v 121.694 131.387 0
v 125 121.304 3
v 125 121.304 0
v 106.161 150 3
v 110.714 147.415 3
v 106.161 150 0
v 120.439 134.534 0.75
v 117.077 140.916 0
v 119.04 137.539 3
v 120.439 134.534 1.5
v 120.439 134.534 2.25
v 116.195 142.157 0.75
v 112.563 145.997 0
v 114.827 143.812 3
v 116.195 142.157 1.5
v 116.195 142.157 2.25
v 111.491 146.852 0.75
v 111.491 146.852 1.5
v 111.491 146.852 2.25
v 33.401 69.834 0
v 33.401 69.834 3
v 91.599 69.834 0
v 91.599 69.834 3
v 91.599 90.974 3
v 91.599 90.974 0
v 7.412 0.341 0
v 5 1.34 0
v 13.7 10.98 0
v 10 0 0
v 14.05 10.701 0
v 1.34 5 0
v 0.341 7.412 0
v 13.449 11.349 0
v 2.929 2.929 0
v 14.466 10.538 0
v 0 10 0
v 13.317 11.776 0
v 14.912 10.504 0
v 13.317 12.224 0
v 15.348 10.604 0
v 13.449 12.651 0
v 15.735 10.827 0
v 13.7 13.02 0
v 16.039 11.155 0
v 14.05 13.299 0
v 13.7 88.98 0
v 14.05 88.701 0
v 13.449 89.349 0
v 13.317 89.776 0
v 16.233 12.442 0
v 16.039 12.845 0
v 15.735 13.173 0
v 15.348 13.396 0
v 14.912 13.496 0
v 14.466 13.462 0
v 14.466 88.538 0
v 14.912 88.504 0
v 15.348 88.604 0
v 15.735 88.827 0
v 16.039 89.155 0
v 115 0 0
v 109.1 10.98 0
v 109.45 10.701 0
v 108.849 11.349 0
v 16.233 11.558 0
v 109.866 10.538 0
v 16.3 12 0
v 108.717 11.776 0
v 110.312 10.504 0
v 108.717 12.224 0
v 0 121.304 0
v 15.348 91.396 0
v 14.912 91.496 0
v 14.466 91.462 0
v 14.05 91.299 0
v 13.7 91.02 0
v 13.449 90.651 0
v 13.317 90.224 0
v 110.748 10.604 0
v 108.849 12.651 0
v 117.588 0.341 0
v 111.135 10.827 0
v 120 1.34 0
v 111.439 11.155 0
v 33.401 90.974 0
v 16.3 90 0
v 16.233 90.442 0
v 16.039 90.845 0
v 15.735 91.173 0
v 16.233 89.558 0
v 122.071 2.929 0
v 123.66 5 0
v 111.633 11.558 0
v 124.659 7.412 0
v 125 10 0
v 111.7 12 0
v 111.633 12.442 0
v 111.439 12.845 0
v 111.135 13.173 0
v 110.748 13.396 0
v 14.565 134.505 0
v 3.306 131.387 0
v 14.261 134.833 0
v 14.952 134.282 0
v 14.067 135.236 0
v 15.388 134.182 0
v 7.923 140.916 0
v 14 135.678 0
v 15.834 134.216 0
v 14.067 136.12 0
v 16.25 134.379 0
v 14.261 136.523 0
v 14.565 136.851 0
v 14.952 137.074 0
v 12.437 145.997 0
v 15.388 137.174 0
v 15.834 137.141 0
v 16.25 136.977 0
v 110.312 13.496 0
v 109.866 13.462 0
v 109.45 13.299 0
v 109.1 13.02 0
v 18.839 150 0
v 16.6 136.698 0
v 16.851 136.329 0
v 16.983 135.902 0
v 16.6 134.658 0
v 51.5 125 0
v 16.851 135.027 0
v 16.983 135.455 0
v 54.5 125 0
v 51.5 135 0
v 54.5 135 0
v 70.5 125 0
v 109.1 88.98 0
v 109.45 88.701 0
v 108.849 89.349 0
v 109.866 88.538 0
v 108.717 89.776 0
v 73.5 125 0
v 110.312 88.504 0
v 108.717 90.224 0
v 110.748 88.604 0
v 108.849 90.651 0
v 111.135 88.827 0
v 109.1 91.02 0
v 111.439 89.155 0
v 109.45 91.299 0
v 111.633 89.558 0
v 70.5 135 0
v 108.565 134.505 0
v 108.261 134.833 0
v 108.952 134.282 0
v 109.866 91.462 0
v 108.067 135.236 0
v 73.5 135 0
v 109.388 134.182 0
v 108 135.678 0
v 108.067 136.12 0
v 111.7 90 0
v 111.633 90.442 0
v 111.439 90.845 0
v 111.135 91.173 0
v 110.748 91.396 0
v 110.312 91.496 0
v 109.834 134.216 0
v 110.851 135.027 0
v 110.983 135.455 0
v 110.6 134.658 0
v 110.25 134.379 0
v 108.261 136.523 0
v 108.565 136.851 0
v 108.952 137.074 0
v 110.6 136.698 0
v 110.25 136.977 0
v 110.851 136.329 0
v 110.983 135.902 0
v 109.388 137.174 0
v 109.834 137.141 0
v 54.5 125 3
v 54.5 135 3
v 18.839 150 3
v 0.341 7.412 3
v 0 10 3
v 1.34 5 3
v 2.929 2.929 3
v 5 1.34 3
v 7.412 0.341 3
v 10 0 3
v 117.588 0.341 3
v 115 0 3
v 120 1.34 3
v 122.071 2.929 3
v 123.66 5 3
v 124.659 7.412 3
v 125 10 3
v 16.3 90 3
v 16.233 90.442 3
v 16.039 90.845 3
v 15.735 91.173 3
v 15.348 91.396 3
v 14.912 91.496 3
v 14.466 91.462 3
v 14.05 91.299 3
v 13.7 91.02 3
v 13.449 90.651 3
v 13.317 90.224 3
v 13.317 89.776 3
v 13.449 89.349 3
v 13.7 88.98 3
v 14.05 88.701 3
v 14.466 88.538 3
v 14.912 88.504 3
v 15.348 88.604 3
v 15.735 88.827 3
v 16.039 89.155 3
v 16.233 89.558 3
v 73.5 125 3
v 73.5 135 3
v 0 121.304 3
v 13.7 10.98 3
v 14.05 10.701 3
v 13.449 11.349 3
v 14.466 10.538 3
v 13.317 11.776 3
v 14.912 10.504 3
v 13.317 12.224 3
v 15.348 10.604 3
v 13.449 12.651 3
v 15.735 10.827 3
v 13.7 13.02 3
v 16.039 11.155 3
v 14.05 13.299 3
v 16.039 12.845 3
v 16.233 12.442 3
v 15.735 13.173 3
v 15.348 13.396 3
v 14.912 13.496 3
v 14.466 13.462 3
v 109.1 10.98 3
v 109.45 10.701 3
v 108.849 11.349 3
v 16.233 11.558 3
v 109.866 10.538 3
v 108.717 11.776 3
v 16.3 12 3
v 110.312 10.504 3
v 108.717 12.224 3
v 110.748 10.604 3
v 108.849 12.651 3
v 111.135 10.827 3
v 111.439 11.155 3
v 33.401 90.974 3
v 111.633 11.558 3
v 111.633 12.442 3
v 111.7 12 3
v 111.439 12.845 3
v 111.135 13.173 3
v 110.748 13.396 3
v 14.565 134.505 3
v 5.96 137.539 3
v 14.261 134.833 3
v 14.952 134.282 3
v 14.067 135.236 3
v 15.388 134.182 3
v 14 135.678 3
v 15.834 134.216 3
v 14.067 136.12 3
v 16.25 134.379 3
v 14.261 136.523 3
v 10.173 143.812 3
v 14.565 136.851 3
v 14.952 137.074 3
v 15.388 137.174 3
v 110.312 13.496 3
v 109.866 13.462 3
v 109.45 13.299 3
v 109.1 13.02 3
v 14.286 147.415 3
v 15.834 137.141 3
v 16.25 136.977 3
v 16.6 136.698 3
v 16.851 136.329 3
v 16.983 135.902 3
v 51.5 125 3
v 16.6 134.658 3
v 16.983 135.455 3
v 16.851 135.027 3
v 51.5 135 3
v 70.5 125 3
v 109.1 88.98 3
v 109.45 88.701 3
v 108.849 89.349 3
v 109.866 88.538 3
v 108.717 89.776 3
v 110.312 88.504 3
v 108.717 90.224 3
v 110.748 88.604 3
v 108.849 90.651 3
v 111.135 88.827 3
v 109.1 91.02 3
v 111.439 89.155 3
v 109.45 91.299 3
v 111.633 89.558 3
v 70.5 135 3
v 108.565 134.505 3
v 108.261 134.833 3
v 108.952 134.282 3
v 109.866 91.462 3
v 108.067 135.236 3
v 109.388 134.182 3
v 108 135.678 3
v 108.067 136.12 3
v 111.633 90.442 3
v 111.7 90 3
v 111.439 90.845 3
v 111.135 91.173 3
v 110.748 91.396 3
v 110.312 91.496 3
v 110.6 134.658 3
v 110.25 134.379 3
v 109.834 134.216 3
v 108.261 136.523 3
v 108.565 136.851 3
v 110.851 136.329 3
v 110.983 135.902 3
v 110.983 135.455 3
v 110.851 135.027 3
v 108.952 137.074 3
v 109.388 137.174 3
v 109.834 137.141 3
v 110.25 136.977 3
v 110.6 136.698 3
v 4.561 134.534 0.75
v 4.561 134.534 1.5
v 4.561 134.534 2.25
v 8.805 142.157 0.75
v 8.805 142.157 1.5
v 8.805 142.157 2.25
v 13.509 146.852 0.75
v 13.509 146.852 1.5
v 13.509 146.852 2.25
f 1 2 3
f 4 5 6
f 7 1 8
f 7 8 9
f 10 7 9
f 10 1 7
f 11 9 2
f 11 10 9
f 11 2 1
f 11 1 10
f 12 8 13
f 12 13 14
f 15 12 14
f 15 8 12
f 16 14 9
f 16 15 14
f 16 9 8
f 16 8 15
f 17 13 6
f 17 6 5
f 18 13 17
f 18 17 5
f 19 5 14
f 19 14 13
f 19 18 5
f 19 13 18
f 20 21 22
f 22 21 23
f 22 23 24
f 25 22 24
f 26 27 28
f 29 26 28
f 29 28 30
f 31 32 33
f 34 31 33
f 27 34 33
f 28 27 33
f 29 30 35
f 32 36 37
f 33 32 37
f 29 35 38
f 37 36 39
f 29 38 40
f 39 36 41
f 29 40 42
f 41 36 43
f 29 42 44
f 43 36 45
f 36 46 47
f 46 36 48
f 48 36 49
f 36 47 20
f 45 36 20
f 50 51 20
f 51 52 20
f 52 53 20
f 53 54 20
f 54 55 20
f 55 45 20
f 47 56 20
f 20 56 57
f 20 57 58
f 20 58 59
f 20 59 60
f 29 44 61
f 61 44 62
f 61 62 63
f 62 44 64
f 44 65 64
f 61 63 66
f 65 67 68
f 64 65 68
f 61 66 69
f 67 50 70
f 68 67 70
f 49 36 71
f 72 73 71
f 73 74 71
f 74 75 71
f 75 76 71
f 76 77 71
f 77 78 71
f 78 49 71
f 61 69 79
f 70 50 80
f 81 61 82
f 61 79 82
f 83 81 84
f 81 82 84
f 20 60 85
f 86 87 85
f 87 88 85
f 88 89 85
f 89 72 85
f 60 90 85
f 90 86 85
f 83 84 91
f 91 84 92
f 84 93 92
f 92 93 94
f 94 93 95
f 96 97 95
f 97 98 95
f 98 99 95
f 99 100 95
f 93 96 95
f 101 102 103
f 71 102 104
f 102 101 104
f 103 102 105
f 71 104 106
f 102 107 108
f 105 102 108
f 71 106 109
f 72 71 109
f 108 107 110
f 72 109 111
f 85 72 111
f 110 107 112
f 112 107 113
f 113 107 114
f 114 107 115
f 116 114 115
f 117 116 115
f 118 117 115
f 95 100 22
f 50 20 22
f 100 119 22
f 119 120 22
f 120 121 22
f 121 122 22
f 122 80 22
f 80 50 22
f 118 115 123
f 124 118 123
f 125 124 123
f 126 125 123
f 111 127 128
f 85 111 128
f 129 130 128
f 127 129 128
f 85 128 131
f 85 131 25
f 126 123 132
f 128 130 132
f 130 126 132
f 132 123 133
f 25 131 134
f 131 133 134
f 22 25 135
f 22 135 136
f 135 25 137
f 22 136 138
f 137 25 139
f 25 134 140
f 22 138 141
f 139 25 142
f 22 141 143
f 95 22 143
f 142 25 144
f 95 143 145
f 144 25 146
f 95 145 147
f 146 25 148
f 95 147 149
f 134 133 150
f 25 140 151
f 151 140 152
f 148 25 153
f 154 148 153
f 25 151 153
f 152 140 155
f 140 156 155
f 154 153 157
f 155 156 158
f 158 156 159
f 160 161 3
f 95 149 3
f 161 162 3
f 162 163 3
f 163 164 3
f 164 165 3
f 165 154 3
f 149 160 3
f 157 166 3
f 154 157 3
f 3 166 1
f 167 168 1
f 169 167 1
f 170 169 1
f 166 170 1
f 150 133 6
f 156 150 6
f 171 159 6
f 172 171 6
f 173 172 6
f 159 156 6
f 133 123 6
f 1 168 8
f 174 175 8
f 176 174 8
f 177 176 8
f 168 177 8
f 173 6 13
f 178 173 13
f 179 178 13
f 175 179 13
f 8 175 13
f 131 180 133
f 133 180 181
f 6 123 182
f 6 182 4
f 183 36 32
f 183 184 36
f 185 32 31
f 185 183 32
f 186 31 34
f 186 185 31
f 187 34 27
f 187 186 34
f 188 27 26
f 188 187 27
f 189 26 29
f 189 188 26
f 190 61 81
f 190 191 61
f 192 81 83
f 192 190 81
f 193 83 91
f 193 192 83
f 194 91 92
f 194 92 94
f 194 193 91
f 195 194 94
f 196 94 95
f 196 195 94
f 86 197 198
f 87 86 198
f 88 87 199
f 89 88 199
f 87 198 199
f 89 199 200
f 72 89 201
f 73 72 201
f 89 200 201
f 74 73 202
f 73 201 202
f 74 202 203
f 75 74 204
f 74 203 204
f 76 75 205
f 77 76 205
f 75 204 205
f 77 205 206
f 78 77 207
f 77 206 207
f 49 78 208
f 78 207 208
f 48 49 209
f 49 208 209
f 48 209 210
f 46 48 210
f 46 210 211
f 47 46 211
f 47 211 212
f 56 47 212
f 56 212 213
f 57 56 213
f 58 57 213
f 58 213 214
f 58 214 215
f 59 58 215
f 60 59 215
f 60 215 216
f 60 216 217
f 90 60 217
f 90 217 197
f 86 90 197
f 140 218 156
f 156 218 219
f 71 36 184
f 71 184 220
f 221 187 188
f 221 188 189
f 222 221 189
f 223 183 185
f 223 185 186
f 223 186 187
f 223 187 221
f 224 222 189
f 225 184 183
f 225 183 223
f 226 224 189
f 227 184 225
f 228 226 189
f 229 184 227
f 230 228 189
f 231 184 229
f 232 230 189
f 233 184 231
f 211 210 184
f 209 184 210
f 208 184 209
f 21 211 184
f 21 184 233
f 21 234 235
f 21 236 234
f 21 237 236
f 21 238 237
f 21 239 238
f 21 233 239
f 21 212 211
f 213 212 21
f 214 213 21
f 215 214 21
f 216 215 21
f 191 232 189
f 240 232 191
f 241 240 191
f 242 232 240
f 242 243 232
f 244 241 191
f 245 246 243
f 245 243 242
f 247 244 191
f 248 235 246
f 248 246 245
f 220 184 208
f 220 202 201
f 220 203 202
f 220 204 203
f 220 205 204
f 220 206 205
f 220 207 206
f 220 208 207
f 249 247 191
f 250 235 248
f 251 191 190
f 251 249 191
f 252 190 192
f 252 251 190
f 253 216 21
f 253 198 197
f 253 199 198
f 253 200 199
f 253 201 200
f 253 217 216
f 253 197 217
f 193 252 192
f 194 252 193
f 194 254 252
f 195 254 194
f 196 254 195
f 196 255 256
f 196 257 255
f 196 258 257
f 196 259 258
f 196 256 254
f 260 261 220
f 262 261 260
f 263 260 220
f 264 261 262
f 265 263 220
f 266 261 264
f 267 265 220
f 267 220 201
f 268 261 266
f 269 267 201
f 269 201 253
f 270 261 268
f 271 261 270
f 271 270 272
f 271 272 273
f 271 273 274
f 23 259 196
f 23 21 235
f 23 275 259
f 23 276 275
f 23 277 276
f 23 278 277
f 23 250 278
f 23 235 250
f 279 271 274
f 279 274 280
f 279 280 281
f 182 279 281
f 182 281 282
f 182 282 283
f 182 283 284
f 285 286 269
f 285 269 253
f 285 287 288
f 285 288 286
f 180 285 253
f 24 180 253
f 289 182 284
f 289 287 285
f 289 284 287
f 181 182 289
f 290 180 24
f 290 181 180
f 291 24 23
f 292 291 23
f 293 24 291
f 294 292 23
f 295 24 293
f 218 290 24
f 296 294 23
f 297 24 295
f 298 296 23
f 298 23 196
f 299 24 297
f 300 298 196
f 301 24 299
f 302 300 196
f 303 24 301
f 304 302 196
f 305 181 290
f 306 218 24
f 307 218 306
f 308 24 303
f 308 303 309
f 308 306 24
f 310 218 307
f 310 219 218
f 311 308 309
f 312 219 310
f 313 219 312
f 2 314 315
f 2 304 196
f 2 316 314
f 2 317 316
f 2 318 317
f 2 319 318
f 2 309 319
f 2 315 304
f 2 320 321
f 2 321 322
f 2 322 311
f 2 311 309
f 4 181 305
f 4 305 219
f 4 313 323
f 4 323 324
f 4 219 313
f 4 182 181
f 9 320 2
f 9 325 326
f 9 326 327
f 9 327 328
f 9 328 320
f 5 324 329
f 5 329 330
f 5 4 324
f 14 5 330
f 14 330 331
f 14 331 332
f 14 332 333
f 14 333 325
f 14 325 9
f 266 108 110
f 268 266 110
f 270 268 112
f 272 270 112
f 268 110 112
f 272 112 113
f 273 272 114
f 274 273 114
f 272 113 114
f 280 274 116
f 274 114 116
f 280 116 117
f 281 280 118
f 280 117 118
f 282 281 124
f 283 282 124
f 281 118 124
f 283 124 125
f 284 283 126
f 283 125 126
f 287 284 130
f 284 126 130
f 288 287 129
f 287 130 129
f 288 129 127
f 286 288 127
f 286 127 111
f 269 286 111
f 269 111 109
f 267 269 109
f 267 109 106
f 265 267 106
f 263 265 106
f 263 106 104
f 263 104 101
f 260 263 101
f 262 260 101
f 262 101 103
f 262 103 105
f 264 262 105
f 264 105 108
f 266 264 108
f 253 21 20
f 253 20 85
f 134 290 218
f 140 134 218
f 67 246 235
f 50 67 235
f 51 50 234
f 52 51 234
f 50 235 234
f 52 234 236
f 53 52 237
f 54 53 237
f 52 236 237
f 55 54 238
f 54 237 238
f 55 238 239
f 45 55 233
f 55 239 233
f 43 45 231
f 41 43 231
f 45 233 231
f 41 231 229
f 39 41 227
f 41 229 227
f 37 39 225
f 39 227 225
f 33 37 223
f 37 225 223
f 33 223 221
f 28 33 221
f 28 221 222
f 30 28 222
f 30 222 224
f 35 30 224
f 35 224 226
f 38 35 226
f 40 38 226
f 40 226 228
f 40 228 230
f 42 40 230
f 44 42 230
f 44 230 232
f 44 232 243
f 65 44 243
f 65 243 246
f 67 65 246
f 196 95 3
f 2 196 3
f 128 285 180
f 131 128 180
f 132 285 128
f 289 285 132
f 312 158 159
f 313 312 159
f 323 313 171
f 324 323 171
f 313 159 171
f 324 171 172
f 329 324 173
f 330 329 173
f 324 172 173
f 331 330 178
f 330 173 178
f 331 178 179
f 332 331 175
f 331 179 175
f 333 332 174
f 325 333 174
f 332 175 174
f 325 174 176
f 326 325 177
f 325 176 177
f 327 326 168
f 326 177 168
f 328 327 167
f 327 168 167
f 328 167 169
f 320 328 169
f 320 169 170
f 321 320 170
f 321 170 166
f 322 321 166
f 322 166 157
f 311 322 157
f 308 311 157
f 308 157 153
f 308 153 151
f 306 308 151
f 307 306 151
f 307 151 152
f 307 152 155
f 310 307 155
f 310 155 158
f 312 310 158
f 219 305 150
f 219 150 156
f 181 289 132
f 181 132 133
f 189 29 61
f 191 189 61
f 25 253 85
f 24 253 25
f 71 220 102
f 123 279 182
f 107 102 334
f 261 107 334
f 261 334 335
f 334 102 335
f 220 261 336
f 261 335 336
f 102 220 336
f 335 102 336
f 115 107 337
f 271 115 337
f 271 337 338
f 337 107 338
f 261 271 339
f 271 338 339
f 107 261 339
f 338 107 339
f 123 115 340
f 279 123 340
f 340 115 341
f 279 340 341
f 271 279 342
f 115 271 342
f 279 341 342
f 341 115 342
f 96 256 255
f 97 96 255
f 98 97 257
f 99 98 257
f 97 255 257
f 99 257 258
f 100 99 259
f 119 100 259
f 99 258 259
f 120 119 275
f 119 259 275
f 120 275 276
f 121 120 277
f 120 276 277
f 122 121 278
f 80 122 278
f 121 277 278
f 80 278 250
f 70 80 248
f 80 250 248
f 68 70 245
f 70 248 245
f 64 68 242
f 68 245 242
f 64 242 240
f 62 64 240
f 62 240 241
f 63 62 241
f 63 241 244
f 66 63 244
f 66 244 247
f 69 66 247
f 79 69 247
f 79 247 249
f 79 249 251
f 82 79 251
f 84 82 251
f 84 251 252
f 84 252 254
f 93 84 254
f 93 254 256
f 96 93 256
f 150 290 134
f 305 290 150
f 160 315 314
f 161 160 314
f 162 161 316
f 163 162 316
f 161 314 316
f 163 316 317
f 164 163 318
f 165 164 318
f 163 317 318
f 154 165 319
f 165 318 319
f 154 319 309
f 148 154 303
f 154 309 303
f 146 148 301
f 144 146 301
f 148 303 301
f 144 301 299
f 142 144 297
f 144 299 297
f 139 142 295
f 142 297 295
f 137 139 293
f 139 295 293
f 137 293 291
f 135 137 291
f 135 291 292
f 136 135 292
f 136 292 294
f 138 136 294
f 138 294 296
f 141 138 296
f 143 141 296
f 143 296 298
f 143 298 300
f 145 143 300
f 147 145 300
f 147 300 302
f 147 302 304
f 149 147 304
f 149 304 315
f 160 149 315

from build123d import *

# Parameters (mm, degrees)
SKETCH1_W           = 125
SKETCH1_H           = 150
BOSS_EXTRUDE1_DEPTH = 3
SKETCH6_R           = 1.5
CUT_EXTRUDE5_DEPTH  = 4
CUT_EXTRUDE6_DEPTH  = 4
SKETCH8_R           = 1.5
CUT_EXTRUDE7_DEPTH  = 4.0000001
FILLET1_R           = 10
SKETCH10_W          = 58.197172172
SKETCH10_H          = 21.139257973
CUT_EXTRUDE8_DEPTH  = 4.0000001
SKETCH11_W          = 3
SKETCH11_H          = 10
CUT_EXTRUDE9_DEPTH  = 4.0000001


with BuildPart() as part:
    # Sketch1 → Boss-Extrude1 (new body)
    with BuildSketch(Plane.XY):
        with Locations((62.5, 75)):
            Rectangle(SKETCH1_W, SKETCH1_H)
    extrude(amount=BOSS_EXTRUDE1_DEPTH)

    # Sketch6 → Cut-Extrude5 (cut, through all)
    with BuildSketch(Plane(origin=(0, 0, 0), x_dir=(-1, 0, 0), z_dir=(0, 0, -1))):
        with Locations((-15.5, 135.678181118)):
            Circle(SKETCH6_R)
        with Locations((-109.5, 135.678181118)):
            Circle(SKETCH6_R)
    extrude(amount=-CUT_EXTRUDE5_DEPTH, mode=Mode.SUBTRACT)

    # Sketch7 → Cut-Extrude6 (cut, through all)
    with BuildSketch(Plane.XY.offset(3)):
        with BuildLine():
            Line((18.83856041, 150), (0, 150))
            Line((0, 150), (0, 121.303805561))
            add(Edge.make_bspline(
                [(0, 121.303805561), (5.130729703, 138.554109372), (8.057120528, 143.174726465), (13.293819899, 147.487302418), (18.83856041, 150)],
                knots=[0, 0, 0, 0, 0, 1, 1, 1, 1, 1], degree=4))
        make_face()
        with BuildLine():
            Line((125, 150), (125, 121.303805561))
            add(Edge.make_bspline(
                [(125, 121.303805561), (119.869270297, 138.554109372), (116.942879472, 143.174726465), (111.706180101, 147.487302418), (106.16143959, 150)],
                knots=[0, 0, 0, 0, 0, 1, 1, 1, 1, 1], degree=4))
            Line((106.16143959, 150), (125, 150))
        make_face()
    extrude(amount=-CUT_EXTRUDE6_DEPTH, mode=Mode.SUBTRACT)

    # Sketch8 → Cut-Extrude7 (cut, through all)
    with BuildSketch(Plane.XY.offset(3)):
        with Locations((14.8, 12)):
            Circle(SKETCH8_R)
        with Locations((110.2, 12)):
            Circle(SKETCH8_R)
        with Locations((14.8, 90)):
            Circle(SKETCH8_R)
        with Locations((110.2, 90)):
            Circle(SKETCH8_R)
    extrude(amount=-CUT_EXTRUDE7_DEPTH, mode=Mode.SUBTRACT)

    # Fillet1
    fillet1_edges = [part.edges().sort_by_distance(p)[0] for p in [
        (125, 0, 1.5),
        (0, 0, 1.5),
    ]]
    fillet(fillet1_edges, radius=FILLET1_R)

    # Sketch10 → Cut-Extrude8 (cut, through all)
    with BuildSketch(Plane.XY.offset(3)):
        with Locations((62.5, 80.404070369)):
            Rectangle(SKETCH10_W, SKETCH10_H)
    extrude(amount=-CUT_EXTRUDE8_DEPTH, mode=Mode.SUBTRACT)

    # Sketch11 → Cut-Extrude9 (cut, through all)
    with BuildSketch(Plane.XY.offset(3)):
        with Locations((72, 130)):
            Rectangle(SKETCH11_W, SKETCH11_H)
        with Locations((53, 130)):
            Rectangle(SKETCH11_W, SKETCH11_H)
    extrude(amount=-CUT_EXTRUDE9_DEPTH, mode=Mode.SUBTRACT)


solid = part.part
